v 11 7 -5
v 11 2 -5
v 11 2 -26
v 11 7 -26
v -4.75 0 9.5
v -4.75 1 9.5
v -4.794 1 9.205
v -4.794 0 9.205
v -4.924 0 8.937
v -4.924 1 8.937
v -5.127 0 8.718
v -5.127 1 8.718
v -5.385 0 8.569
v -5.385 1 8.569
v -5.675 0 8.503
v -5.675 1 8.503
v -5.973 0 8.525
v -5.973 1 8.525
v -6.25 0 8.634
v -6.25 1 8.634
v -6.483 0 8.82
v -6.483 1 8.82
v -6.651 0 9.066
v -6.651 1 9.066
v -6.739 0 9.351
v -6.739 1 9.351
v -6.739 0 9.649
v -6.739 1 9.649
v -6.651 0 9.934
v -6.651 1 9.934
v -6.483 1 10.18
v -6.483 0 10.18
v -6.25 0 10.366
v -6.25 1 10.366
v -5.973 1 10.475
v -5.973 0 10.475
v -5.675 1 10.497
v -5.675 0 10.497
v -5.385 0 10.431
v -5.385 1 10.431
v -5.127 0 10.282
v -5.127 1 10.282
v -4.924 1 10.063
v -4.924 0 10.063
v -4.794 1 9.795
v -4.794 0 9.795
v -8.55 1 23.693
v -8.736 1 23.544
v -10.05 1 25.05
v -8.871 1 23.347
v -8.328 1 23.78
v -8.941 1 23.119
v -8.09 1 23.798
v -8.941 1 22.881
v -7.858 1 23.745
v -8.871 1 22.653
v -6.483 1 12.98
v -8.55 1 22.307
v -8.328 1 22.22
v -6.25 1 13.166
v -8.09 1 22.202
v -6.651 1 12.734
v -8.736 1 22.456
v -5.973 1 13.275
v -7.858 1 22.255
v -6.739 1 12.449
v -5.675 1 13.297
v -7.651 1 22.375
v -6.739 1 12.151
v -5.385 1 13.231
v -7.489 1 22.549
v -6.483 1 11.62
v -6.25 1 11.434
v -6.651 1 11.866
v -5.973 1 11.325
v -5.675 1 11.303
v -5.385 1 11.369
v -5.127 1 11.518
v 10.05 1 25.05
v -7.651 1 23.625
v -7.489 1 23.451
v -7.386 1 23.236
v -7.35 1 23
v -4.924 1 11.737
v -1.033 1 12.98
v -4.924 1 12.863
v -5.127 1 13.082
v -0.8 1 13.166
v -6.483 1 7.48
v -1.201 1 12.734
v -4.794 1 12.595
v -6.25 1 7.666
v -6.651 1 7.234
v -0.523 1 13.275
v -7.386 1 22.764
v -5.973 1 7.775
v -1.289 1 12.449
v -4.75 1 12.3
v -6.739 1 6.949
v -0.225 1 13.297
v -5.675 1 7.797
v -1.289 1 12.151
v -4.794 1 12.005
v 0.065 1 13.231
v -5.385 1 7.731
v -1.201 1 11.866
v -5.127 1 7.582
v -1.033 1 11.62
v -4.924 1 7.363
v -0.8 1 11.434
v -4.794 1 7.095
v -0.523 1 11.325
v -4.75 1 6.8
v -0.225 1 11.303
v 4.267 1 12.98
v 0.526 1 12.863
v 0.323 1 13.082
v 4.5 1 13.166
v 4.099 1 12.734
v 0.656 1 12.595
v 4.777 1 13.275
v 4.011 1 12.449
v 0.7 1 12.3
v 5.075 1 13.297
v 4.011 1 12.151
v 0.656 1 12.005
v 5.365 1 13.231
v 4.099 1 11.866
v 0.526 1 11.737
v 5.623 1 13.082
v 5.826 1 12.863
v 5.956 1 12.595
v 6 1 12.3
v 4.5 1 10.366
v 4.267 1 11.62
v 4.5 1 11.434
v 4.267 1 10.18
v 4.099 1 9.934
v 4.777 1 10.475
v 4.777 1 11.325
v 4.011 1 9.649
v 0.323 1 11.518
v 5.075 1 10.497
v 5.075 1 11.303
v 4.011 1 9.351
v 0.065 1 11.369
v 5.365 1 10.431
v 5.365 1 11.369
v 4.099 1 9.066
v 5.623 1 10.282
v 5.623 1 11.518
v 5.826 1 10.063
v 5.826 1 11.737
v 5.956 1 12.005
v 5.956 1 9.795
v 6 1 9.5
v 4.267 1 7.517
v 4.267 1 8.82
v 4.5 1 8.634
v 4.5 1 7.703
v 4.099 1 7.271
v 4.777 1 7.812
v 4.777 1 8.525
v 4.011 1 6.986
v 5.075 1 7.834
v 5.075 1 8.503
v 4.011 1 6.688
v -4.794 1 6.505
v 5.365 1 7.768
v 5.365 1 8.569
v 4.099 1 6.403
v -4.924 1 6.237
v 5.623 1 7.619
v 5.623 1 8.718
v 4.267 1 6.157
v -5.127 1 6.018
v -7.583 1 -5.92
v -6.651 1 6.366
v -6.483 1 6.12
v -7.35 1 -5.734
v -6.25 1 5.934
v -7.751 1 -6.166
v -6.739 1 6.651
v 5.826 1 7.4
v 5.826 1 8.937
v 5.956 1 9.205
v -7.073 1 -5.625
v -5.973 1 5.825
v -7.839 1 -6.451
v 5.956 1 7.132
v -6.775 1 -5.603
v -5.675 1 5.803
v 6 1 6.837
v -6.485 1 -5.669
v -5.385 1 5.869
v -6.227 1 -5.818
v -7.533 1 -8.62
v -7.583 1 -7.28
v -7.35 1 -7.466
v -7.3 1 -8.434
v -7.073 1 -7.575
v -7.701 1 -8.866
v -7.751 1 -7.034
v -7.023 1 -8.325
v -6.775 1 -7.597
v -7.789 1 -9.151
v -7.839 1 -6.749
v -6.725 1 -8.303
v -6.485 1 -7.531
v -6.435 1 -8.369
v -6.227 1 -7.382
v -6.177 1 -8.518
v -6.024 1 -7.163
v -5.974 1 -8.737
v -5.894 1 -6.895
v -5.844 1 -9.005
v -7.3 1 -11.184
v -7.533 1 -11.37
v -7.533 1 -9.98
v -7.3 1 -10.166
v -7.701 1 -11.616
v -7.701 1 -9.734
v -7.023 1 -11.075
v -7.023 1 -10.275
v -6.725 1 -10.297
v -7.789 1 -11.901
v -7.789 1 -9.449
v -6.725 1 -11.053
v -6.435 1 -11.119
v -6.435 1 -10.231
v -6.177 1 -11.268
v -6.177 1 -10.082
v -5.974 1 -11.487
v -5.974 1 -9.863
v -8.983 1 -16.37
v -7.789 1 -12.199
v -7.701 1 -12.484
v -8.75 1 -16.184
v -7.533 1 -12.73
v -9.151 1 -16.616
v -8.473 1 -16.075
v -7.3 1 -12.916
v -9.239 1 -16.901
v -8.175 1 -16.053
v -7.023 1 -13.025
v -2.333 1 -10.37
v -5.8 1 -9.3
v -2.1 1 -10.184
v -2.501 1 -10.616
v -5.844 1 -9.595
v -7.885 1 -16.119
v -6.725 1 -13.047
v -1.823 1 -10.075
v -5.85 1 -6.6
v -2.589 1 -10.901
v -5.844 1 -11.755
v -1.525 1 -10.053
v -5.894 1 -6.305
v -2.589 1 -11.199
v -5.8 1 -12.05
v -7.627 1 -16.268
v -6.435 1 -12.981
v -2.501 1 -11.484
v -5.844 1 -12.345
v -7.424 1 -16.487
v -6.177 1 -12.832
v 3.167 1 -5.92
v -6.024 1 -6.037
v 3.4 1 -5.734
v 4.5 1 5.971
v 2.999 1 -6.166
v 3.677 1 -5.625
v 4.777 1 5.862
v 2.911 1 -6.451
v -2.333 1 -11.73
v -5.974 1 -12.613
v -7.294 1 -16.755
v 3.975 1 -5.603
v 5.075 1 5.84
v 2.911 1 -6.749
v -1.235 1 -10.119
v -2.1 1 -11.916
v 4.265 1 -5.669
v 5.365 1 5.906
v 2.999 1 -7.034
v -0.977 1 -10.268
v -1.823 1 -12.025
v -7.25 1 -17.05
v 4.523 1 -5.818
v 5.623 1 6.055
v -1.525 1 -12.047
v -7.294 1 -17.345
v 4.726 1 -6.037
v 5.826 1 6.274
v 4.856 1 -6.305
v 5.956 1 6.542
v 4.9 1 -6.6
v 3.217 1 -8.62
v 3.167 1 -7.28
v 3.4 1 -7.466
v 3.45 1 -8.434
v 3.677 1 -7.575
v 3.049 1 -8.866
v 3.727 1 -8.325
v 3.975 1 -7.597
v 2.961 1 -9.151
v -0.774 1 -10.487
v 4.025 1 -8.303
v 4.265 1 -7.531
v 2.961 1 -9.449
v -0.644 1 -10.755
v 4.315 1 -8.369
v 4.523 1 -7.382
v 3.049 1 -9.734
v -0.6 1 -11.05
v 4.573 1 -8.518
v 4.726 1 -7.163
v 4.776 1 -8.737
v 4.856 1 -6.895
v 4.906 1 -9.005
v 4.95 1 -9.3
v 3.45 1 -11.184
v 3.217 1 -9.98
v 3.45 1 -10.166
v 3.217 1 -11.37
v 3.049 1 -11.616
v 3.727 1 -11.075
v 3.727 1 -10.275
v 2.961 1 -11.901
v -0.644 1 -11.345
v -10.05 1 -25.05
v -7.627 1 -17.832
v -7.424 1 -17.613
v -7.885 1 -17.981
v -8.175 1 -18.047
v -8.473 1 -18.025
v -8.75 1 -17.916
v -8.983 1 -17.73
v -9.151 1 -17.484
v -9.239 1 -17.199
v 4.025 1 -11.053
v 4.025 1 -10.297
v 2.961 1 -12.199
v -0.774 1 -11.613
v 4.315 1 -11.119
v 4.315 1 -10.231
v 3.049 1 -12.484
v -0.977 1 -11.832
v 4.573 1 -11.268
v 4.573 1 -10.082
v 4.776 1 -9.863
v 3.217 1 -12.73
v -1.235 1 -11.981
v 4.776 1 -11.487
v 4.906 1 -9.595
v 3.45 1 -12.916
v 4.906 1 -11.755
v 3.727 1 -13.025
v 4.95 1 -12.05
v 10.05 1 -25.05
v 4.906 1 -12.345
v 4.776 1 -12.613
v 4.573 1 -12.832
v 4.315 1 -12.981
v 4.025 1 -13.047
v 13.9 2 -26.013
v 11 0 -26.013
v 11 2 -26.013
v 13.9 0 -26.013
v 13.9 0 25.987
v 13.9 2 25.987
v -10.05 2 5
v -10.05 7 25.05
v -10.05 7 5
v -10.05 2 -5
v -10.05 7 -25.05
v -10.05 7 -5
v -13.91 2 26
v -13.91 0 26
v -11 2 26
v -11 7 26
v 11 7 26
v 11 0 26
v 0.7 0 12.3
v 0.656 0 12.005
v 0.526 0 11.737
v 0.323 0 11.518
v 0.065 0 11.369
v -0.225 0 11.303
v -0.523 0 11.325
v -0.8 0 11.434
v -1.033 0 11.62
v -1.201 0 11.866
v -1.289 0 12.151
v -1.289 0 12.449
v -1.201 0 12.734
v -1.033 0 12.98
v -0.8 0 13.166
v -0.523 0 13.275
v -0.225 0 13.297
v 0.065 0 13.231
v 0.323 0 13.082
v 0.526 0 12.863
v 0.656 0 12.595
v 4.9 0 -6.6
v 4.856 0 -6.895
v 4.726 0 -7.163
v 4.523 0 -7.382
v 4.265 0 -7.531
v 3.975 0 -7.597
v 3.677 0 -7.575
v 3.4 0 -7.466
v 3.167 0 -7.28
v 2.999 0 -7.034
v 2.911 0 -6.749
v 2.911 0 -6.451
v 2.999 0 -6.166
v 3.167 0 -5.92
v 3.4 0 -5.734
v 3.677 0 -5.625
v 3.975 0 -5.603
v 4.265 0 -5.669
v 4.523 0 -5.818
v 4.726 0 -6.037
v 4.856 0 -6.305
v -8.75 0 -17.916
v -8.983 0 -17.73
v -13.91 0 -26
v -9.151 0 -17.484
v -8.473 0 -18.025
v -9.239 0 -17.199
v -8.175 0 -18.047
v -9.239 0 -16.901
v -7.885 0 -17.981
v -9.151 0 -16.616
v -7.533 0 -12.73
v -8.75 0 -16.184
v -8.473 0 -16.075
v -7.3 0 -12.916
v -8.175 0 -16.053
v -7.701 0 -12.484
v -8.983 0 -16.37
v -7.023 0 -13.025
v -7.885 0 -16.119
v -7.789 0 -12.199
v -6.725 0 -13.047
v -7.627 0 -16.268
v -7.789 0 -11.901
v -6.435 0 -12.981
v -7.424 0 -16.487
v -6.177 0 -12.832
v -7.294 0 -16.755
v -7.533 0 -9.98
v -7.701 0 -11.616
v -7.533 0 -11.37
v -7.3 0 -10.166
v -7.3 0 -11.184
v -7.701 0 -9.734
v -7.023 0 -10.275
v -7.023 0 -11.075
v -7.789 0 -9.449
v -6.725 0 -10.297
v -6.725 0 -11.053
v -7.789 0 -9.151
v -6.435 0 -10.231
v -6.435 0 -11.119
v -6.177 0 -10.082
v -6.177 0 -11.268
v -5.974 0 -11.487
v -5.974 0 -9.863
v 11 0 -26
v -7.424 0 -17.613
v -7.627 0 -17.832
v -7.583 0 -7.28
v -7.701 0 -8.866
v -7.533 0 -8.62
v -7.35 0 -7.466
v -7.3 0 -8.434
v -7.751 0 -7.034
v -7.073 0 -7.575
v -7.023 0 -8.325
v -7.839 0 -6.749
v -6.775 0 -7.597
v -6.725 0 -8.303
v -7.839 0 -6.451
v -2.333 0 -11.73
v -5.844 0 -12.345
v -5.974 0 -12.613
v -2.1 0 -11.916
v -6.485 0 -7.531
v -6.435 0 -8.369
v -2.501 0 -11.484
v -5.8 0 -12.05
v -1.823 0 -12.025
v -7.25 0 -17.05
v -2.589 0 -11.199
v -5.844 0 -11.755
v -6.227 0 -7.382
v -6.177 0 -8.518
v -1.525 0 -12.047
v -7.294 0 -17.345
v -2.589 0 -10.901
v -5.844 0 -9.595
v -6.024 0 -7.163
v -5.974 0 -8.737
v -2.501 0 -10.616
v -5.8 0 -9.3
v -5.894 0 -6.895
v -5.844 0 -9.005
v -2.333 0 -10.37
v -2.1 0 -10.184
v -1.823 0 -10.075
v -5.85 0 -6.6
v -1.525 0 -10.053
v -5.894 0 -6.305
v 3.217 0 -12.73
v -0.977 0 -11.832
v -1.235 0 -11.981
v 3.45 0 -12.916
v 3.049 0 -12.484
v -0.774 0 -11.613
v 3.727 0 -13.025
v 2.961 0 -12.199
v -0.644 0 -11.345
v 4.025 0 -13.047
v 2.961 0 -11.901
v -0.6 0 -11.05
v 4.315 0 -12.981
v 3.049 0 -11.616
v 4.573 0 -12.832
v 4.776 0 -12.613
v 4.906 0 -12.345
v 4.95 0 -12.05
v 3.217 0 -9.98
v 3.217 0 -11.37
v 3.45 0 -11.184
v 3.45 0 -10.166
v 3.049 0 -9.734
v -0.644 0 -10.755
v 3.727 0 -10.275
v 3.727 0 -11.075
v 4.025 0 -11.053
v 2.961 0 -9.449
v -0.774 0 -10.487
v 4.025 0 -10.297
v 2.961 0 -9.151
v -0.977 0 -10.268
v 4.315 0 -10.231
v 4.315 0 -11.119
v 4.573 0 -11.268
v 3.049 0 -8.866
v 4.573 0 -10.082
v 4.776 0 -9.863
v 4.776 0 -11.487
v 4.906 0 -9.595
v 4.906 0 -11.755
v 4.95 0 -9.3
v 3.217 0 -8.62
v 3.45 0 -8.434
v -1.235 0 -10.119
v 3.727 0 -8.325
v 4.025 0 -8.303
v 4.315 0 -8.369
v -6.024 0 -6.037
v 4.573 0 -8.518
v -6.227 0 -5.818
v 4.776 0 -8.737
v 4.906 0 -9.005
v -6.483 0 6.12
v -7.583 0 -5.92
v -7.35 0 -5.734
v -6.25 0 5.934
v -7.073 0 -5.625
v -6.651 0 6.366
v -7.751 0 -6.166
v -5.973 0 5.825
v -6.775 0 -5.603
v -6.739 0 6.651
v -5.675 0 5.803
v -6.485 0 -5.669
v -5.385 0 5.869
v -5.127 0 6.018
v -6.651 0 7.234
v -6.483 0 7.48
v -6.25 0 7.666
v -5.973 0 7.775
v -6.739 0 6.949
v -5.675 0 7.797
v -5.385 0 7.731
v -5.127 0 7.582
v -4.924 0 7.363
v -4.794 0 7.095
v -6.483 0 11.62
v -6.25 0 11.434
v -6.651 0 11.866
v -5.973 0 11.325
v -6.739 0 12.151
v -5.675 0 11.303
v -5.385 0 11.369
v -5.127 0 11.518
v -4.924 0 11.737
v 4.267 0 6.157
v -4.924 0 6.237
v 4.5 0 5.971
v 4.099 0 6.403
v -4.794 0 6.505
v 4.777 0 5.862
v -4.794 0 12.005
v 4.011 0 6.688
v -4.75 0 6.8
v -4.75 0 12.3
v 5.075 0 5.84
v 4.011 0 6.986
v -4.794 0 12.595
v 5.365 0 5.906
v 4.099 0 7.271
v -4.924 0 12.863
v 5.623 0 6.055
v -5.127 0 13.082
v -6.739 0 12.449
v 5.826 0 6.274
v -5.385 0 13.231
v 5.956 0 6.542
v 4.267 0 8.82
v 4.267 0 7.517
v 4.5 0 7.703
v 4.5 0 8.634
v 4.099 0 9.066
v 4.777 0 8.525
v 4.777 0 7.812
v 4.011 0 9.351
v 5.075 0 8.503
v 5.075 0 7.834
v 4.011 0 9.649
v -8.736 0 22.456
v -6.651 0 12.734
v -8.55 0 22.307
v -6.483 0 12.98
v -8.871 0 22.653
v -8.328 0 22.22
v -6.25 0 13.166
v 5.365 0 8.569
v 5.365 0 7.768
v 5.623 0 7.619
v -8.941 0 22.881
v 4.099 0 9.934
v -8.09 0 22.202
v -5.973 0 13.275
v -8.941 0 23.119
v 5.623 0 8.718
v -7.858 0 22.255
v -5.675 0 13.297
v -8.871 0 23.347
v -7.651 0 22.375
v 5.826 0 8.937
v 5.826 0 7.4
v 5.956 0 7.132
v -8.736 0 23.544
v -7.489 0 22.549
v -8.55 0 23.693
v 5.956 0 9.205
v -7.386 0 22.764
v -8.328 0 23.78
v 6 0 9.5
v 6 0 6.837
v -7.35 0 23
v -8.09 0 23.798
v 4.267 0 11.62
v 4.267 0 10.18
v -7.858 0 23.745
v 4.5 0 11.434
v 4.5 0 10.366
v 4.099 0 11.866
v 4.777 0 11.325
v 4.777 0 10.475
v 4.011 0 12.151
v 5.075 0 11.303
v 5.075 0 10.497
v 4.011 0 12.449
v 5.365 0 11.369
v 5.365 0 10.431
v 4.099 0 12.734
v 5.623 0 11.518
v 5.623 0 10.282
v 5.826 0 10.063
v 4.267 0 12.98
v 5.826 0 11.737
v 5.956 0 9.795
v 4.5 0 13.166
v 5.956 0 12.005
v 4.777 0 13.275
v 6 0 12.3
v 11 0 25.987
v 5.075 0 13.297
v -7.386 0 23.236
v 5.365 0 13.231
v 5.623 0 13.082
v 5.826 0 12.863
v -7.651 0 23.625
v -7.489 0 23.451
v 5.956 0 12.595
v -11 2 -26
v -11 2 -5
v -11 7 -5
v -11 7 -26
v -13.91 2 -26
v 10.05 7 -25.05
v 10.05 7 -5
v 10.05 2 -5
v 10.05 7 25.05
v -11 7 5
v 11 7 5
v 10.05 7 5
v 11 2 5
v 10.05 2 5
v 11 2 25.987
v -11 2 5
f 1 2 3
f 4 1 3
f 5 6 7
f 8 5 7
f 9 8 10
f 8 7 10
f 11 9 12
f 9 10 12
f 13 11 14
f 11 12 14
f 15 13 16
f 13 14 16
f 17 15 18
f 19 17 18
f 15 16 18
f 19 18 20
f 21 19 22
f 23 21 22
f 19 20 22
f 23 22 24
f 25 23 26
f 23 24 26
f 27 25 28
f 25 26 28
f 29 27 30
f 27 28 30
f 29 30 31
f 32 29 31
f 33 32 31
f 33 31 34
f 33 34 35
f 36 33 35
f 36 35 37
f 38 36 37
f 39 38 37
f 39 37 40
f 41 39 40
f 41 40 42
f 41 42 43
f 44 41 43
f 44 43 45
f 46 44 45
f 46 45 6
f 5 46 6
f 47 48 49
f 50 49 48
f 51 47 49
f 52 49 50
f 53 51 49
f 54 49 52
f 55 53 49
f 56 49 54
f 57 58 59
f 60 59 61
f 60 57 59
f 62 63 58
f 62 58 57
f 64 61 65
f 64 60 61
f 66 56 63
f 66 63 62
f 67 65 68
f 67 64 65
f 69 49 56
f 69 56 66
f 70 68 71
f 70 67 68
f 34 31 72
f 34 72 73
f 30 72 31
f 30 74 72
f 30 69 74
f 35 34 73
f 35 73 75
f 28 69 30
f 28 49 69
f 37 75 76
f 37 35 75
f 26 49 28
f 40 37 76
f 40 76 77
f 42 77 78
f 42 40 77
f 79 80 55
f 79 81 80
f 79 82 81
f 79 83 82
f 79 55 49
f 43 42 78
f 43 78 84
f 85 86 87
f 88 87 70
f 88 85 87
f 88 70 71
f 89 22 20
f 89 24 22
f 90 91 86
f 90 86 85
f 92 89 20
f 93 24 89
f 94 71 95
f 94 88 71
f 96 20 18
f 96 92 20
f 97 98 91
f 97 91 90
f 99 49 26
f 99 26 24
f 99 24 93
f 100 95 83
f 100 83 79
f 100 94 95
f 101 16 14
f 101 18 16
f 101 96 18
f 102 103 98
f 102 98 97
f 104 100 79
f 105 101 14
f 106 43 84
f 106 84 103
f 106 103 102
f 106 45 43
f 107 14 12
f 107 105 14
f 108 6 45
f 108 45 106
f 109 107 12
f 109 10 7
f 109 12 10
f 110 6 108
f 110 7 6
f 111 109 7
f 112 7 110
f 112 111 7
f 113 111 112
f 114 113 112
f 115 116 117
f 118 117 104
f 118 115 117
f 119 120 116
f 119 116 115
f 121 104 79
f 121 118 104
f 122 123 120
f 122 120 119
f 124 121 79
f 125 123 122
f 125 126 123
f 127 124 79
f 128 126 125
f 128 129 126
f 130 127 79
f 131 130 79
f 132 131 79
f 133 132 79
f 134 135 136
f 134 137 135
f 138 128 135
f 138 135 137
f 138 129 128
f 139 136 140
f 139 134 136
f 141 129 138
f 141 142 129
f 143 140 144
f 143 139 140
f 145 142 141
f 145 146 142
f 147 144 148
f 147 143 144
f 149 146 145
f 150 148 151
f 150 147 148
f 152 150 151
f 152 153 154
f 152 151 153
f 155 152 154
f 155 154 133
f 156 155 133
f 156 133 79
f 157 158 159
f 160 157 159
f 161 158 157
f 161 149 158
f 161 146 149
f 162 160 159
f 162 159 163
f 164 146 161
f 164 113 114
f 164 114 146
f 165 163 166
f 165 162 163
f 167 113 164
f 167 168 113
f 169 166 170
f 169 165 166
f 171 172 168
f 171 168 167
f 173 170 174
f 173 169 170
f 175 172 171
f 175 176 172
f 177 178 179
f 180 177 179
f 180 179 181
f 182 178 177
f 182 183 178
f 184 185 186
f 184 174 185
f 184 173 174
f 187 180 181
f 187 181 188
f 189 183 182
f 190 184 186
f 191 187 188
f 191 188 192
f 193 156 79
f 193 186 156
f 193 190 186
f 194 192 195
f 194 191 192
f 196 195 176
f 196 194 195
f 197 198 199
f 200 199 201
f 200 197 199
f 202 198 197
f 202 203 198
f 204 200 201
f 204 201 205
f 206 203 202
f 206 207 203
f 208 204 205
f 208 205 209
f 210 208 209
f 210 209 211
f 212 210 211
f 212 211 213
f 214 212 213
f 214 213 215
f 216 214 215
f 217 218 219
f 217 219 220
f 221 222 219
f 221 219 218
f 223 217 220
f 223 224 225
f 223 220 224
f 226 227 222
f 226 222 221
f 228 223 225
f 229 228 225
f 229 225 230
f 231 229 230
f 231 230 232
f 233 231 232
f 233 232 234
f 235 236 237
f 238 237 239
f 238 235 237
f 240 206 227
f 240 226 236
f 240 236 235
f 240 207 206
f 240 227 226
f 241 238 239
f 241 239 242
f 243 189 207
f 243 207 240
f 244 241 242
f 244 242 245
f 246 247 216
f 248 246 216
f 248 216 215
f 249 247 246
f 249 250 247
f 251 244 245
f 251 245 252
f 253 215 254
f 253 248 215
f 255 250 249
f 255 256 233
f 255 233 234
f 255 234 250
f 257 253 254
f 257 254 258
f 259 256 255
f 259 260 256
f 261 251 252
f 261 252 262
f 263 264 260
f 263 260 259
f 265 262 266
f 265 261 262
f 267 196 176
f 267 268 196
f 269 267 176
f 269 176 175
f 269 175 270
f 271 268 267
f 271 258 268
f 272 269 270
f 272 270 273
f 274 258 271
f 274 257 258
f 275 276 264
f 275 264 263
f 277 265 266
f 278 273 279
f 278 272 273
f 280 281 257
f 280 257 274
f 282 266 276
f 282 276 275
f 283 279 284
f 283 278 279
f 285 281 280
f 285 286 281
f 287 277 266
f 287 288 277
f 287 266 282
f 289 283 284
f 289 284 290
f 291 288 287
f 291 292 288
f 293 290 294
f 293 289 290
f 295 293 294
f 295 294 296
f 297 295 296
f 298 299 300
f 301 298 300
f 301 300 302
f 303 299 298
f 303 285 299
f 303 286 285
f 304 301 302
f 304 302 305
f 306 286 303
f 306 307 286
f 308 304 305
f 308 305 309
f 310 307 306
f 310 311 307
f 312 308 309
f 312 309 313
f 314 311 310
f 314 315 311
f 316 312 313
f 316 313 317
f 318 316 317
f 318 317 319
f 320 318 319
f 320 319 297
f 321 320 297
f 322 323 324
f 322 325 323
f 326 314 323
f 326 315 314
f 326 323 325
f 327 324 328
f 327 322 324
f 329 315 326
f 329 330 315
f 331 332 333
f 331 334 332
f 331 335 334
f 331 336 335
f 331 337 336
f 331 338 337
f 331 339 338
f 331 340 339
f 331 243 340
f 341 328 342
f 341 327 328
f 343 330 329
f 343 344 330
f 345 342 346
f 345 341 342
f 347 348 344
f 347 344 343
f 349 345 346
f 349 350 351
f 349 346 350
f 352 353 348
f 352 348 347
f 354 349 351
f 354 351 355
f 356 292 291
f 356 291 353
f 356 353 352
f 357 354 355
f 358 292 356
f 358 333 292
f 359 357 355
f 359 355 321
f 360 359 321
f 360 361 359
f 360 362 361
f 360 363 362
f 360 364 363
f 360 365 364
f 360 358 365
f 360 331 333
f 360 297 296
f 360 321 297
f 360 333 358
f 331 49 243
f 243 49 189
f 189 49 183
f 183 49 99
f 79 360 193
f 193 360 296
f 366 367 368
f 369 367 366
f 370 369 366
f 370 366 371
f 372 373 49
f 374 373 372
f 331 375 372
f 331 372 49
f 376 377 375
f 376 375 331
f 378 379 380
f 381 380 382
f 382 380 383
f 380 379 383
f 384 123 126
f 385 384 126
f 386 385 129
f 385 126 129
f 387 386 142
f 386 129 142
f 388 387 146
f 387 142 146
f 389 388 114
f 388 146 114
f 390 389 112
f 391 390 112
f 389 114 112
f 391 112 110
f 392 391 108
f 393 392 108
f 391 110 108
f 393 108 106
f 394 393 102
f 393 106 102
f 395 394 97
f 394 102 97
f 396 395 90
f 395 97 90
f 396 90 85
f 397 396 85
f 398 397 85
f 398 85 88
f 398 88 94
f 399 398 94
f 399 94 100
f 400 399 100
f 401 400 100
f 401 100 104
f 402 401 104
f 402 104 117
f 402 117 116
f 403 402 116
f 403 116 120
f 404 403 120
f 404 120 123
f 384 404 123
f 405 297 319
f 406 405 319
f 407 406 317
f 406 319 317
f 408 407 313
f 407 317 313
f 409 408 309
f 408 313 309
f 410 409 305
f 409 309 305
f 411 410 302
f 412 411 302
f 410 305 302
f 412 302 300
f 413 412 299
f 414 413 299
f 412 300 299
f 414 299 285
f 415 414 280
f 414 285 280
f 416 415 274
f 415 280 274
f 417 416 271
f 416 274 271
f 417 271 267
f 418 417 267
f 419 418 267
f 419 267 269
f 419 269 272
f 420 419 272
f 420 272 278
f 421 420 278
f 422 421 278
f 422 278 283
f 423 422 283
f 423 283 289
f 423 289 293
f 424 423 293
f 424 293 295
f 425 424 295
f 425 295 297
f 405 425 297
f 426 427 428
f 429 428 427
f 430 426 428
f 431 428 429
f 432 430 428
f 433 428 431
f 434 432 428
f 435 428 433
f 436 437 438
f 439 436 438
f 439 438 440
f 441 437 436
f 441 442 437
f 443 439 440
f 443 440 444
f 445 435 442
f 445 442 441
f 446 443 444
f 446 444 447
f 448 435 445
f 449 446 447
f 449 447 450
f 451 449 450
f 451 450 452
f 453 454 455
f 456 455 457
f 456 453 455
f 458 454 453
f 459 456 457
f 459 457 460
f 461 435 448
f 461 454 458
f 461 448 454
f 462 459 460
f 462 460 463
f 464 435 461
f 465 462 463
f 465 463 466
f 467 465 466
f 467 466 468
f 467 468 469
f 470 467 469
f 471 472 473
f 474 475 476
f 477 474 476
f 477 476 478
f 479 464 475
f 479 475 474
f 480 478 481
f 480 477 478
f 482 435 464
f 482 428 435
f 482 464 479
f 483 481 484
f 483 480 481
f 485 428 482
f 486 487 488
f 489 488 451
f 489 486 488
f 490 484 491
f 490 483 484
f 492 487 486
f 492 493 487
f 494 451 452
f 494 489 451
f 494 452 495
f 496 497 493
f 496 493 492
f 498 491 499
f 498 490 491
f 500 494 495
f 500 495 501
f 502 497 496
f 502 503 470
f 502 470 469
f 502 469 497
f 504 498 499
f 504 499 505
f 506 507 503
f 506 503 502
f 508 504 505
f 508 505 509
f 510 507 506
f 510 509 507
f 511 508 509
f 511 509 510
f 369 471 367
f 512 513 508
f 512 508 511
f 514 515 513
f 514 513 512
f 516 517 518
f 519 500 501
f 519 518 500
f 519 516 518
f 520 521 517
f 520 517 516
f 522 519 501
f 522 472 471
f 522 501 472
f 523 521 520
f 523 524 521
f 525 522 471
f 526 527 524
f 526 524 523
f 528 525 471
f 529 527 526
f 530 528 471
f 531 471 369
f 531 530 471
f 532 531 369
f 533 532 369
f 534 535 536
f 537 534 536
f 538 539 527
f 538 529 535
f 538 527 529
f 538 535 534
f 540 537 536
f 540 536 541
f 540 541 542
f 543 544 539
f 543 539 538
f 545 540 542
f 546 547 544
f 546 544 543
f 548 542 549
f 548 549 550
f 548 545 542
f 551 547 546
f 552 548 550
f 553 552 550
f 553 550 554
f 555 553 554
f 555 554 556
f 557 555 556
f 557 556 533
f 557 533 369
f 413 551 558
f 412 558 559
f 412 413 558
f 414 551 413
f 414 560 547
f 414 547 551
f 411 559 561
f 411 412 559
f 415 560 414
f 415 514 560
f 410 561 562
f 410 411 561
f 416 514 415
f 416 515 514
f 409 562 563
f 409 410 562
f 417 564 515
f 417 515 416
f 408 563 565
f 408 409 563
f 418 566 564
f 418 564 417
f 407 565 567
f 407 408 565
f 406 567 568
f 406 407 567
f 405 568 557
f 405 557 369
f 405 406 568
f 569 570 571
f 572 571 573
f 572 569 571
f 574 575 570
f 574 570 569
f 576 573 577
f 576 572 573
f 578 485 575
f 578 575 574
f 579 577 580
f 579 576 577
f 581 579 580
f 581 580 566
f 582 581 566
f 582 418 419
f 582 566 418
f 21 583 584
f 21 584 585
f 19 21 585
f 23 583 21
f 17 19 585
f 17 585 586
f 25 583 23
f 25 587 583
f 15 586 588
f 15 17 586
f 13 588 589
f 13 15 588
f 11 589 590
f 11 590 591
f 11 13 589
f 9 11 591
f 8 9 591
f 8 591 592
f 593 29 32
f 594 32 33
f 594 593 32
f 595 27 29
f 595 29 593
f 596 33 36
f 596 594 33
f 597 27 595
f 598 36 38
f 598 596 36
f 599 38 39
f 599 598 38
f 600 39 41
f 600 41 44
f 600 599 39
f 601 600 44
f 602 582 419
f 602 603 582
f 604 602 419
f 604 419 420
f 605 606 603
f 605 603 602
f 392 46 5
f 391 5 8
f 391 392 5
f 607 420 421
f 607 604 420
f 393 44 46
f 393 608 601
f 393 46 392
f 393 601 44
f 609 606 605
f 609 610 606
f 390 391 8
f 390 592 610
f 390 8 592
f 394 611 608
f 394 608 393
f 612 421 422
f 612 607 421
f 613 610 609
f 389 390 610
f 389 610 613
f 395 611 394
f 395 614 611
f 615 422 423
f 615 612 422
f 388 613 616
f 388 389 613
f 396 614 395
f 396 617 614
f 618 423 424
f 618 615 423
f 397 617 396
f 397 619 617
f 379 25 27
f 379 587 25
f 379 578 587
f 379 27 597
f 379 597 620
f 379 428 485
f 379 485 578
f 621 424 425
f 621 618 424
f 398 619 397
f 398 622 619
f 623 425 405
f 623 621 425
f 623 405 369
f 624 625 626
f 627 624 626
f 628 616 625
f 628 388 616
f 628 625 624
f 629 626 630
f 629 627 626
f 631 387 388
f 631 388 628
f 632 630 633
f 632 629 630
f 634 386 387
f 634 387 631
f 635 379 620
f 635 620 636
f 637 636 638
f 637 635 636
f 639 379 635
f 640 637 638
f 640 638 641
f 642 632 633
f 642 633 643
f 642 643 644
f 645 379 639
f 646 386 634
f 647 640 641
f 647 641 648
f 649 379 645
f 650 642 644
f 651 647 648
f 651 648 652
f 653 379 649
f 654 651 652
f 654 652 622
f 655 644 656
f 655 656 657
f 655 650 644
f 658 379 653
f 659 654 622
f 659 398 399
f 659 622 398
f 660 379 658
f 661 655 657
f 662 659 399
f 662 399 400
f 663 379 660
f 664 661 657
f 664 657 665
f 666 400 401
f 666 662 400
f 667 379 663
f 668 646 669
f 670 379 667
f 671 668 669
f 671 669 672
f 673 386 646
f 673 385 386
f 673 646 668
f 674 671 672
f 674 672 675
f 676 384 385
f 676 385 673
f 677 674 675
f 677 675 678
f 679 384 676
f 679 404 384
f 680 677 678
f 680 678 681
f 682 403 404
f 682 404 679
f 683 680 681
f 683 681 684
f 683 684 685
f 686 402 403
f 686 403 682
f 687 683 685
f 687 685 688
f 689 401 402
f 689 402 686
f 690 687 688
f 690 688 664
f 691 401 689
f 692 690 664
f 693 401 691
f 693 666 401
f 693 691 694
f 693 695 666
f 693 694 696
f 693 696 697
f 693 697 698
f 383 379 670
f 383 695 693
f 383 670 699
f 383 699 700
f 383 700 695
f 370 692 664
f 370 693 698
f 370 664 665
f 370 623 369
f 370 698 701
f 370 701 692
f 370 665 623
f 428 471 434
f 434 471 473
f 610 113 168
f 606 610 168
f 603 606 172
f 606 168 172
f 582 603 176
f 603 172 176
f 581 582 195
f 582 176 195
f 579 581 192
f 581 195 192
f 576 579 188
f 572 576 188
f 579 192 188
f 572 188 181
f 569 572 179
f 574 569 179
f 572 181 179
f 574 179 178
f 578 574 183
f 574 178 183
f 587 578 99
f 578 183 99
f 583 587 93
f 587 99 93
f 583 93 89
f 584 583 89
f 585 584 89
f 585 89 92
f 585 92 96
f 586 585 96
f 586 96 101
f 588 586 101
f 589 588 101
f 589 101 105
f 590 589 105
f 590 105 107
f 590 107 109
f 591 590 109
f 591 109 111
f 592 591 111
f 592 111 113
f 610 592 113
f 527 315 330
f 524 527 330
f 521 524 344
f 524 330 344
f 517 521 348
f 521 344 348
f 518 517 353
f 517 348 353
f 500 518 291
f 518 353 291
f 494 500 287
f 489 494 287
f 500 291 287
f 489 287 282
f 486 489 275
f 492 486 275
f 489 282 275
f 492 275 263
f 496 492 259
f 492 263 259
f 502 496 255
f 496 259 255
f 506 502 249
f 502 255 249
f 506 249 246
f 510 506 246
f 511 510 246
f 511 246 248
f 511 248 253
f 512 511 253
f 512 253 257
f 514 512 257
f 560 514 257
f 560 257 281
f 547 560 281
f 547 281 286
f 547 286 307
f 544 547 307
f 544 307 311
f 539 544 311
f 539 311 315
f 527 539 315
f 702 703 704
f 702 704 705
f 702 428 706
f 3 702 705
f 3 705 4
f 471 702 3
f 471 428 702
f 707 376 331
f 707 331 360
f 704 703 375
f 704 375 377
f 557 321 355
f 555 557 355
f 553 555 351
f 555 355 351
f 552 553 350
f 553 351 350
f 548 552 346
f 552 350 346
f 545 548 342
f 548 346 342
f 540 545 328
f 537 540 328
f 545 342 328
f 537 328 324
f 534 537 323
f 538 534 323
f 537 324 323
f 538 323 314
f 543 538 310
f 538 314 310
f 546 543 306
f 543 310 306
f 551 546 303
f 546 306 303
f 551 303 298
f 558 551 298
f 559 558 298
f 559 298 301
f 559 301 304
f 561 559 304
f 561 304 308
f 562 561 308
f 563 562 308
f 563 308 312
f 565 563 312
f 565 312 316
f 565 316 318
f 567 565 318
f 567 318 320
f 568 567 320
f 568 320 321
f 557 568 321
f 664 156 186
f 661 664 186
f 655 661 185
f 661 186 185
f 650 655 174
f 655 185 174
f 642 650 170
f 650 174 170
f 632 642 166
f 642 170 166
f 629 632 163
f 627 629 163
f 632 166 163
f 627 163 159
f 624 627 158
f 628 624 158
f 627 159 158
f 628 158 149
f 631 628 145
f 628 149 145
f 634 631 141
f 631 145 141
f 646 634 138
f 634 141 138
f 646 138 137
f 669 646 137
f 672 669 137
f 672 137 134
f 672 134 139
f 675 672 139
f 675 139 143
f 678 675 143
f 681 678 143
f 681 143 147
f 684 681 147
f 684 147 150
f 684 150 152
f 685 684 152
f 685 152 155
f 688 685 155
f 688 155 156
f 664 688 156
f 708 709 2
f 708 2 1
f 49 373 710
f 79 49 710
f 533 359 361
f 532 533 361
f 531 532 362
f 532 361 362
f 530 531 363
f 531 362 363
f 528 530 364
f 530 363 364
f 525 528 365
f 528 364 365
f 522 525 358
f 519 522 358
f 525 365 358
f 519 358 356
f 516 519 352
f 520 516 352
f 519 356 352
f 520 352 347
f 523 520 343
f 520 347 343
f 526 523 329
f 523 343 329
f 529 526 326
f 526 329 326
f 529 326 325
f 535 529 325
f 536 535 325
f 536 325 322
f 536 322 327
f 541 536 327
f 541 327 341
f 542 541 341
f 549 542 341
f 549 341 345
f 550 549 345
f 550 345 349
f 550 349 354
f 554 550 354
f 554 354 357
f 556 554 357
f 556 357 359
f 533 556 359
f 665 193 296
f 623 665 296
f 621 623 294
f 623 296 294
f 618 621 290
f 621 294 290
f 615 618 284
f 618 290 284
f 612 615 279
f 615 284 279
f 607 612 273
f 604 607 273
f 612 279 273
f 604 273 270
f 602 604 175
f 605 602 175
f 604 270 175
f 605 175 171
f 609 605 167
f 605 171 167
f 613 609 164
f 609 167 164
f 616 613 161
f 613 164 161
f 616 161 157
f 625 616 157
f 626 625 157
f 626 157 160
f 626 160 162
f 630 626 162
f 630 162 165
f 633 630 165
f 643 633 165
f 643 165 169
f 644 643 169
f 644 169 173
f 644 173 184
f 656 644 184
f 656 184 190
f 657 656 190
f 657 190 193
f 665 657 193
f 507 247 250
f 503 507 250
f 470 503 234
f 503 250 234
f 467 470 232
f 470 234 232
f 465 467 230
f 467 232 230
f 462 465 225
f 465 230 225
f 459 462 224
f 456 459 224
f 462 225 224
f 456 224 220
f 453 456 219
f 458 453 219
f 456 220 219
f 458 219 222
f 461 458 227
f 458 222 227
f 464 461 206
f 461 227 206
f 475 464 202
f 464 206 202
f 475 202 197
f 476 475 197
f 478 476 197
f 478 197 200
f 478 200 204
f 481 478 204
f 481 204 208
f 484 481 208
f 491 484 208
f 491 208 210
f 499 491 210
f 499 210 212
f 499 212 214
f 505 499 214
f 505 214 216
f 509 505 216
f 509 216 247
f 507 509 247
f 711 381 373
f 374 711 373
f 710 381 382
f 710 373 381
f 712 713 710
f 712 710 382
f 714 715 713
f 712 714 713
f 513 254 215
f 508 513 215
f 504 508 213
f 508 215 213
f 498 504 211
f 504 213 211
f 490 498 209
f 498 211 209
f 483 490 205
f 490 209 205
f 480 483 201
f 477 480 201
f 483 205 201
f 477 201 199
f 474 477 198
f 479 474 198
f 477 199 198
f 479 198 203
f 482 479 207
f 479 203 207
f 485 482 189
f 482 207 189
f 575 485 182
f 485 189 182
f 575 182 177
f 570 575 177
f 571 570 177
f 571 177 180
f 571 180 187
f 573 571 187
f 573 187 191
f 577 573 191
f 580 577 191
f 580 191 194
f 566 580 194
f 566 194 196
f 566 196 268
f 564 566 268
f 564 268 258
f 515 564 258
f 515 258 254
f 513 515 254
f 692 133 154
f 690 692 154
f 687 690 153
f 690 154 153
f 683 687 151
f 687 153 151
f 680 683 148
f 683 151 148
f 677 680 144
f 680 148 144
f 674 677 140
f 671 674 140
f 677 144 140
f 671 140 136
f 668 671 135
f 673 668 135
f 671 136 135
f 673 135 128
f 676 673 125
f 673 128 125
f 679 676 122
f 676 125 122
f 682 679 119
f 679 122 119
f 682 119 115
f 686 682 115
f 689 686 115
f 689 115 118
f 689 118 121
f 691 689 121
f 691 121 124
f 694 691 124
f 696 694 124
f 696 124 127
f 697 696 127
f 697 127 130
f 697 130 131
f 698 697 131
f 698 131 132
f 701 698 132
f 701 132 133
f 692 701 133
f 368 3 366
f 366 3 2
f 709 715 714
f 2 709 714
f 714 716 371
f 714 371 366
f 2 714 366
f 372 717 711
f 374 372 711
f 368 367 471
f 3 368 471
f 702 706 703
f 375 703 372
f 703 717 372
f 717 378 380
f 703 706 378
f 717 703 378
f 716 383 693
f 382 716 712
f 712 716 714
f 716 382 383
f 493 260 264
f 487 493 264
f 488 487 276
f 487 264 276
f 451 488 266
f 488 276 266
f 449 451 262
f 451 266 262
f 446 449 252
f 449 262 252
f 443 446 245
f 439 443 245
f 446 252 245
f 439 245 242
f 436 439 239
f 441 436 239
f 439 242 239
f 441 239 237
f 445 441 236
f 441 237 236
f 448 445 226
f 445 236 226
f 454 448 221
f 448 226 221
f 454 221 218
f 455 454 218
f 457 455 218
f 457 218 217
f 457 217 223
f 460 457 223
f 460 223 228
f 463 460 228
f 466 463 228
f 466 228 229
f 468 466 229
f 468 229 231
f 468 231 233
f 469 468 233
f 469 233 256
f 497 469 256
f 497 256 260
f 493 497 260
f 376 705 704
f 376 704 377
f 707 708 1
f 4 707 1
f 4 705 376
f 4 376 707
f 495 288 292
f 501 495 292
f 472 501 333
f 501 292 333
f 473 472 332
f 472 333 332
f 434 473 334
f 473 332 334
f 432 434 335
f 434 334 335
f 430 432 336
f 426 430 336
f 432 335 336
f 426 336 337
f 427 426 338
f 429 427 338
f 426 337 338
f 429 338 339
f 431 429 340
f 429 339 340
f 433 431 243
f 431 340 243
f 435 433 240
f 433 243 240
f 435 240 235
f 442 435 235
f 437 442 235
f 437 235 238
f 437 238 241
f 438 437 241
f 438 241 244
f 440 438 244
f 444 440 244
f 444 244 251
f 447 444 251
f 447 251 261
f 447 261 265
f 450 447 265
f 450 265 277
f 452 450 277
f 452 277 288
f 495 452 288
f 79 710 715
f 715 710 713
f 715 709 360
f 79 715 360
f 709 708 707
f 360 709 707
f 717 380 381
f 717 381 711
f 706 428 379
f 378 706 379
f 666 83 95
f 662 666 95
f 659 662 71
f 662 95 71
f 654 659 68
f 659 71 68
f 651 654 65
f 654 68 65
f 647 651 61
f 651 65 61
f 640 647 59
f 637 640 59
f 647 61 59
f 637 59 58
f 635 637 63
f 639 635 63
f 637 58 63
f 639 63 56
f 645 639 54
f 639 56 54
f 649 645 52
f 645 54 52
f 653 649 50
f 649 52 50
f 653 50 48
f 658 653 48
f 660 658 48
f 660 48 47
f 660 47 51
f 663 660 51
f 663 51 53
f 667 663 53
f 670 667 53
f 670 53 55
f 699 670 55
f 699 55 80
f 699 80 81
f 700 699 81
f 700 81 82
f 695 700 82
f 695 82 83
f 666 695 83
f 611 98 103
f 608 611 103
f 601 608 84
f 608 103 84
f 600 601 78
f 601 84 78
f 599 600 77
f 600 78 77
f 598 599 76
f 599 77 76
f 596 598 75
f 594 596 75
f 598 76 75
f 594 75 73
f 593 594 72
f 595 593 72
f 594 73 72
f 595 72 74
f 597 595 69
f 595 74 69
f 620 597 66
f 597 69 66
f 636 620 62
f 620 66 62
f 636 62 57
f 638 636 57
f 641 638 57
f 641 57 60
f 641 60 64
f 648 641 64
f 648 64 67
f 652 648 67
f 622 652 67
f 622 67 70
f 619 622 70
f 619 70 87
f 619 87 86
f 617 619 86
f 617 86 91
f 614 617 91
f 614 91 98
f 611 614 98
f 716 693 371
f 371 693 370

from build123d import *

# Parameters (mm, degrees)
SKETCH1_W               = 22
SKETCH1_H               = 52
BOSS_EXTRUDE1_DEPTH     = 7
SKETCH2_W               = 20.1
SKETCH2_H               = 50.1
CUT_EXTRUDE1_DEPTH      = 6
SKETCH7_R               = 0.8
CUT_EXTRUDE6_DEPTH      = 7
CUT_EXTRUDE6_DEPTH_BACK = 2
CUT_EXTRUDE7_REACH      = 3
SKETCH8_R               = 1
CUT_EXTRUDE9_REACH      = 3
SKETCH9_R               = 1
CUT_EXTRUDE10_REACH     = 3
SKETCH10_R              = 1
CUT_EXTRUDE11_REACH     = 3
SKETCH11_R              = 1
CUT_EXTRUDE12_REACH     = 3
SKETCH12_R              = 1
CUT_EXTRUDE13_REACH     = 3
SKETCH13_R              = 1
CUT_EXTRUDE14_REACH     = 3
SKETCH14_R              = 1
CUT_EXTRUDE15_REACH     = 3
SKETCH15_R              = 1
CUT_EXTRUDE16_REACH     = 3
SKETCH16_R              = 1
SKETCH18_W              = 2.91
SKETCH18_H              = 52
BOSS_EXTRUDE2_DEPTH     = 2
SKETCH18_3_W            = 2.9
SKETCH18_3_H            = 52
BOSS_EXTRUDE3_DEPTH     = 2
SKETCH19_W              = 10
SKETCH19_H              = 5
CUT_EXTRUDE17_DEPTH     = 25.9


with BuildPart() as part:
    # Sketch1 → Boss-Extrude1 (new body)
    with BuildSketch(Plane(origin=(0, 0, 0), x_dir=(1, 0, 0), z_dir=(0, 1, 0))):
        Rectangle(SKETCH1_W, SKETCH1_H)
    extrude(amount=BOSS_EXTRUDE1_DEPTH)

    # Sketch2 → Cut-Extrude1 (cut)
    with BuildSketch(Plane(origin=(0, 7, 0), x_dir=(1, 0, 0), z_dir=(0, 1, 0))):
        Rectangle(SKETCH2_W, SKETCH2_H)
    extrude(amount=-CUT_EXTRUDE1_DEPTH, mode=Mode.SUBTRACT)

    # Sketch7 → Cut-Extrude6 (cut, two sides)
    with BuildSketch(Plane(origin=(0, 1, 0), x_dir=(1, 0, 0), z_dir=(0, 1, 0))) as cut_extrude6_sk:
        with Locations((-8.15, -23)):
            Circle(SKETCH7_R)
    extrude(amount=CUT_EXTRUDE6_DEPTH, mode=Mode.SUBTRACT)
    extrude(cut_extrude6_sk.sketch, amount=-CUT_EXTRUDE6_DEPTH_BACK, mode=Mode.SUBTRACT)

    # Sketch8 → Cut-Extrude7 (cut, up to next)
    with BuildSketch(Plane(origin=(0, 1, 0), x_dir=(1, 0, 0), z_dir=(0, 1, 0)), mode=Mode.PRIVATE) as cut_extrude7_sk1:
        with Locations((-5.75, -12.3)):
            Circle(SKETCH8_R)
    cut_extrude7_tool1 = extrude(cut_extrude7_sk1.sketch, amount=-CUT_EXTRUDE7_REACH, mode=Mode.PRIVATE) & part.part
    add(cut_extrude7_tool1.solids().sort_by_distance((-5.75, 1, 12.3))[0], mode=Mode.SUBTRACT)
    # Sketch8 → Cut-Extrude7 (cut, up to next)
    with BuildSketch(Plane(origin=(0, 1, 0), x_dir=(1, 0, 0), z_dir=(0, 1, 0)), mode=Mode.PRIVATE) as cut_extrude7_sk2:
        with Locations((5, -12.3)):
            Circle(SKETCH8_R)
    cut_extrude7_tool2 = extrude(cut_extrude7_sk2.sketch, amount=-CUT_EXTRUDE7_REACH, mode=Mode.PRIVATE) & part.part
    add(cut_extrude7_tool2.solids().sort_by_distance((5, 1, 12.3))[0], mode=Mode.SUBTRACT)

    # Sketch9 → Cut-Extrude9 (cut, up to next)
    with BuildSketch(Plane(origin=(0, 1, 0), x_dir=(1, 0, 0), z_dir=(0, 1, 0)), mode=Mode.PRIVATE) as cut_extrude9_sk1:
        with Locations((-5.75, -9.5)):
            Circle(SKETCH9_R)
    cut_extrude9_tool1 = extrude(cut_extrude9_sk1.sketch, amount=-CUT_EXTRUDE9_REACH, mode=Mode.PRIVATE) & part.part
    add(cut_extrude9_tool1.solids().sort_by_distance((-5.75, 1, 9.5))[0], mode=Mode.SUBTRACT)
    # Sketch9 → Cut-Extrude9 (cut, up to next)
    with BuildSketch(Plane(origin=(0, 1, 0), x_dir=(1, 0, 0), z_dir=(0, 1, 0)), mode=Mode.PRIVATE) as cut_extrude9_sk2:
        with Locations((5, -9.5)):
            Circle(SKETCH9_R)
    cut_extrude9_tool2 = extrude(cut_extrude9_sk2.sketch, amount=-CUT_EXTRUDE9_REACH, mode=Mode.PRIVATE) & part.part
    add(cut_extrude9_tool2.solids().sort_by_distance((5, 1, 9.5))[0], mode=Mode.SUBTRACT)

    # Sketch10 → Cut-Extrude10 (cut, up to next)
    with BuildSketch(Plane(origin=(0, 1, 0), x_dir=(1, 0, 0), z_dir=(0, 1, 0)), mode=Mode.PRIVATE) as cut_extrude10_sk1:
        with Locations((-5.75, -6.8)):
            Circle(SKETCH10_R)
    cut_extrude10_tool1 = extrude(cut_extrude10_sk1.sketch, amount=-CUT_EXTRUDE10_REACH, mode=Mode.PRIVATE) & part.part
    add(cut_extrude10_tool1.solids().sort_by_distance((-5.75, 1, 6.8))[0], mode=Mode.SUBTRACT)
    # Sketch10 → Cut-Extrude10 (cut, up to next)
    with BuildSketch(Plane(origin=(0, 1, 0), x_dir=(1, 0, 0), z_dir=(0, 1, 0)), mode=Mode.PRIVATE) as cut_extrude10_sk2:
        with Locations((5, -6.837159935)):
            Circle(SKETCH10_R)
    cut_extrude10_tool2 = extrude(cut_extrude10_sk2.sketch, amount=-CUT_EXTRUDE10_REACH, mode=Mode.PRIVATE) & part.part
    add(cut_extrude10_tool2.solids().sort_by_distance((5, 1, 6.83716))[0], mode=Mode.SUBTRACT)

    # Sketch11 → Cut-Extrude11 (cut, up to next)
    with BuildSketch(Plane(origin=(0, 1, 0), x_dir=(1, 0, 0), z_dir=(0, 1, 0)), mode=Mode.PRIVATE) as cut_extrude11_sk1:
        with Locations((-0.3, -12.3)):
            Circle(SKETCH11_R)
    cut_extrude11_tool1 = extrude(cut_extrude11_sk1.sketch, amount=-CUT_EXTRUDE11_REACH, mode=Mode.PRIVATE) & part.part
    add(cut_extrude11_tool1.solids().sort_by_distance((-0.3, 1, 12.3))[0], mode=Mode.SUBTRACT)

    # Sketch12 → Cut-Extrude12 (cut, up to next)
    with BuildSketch(Plane(origin=(0, 1, 0), x_dir=(1, 0, 0), z_dir=(0, 1, 0)), mode=Mode.PRIVATE) as cut_extrude12_sk1:
        with Locations((3.95, 12.05)):
            Circle(SKETCH12_R)
    cut_extrude12_tool1 = extrude(cut_extrude12_sk1.sketch, amount=-CUT_EXTRUDE12_REACH, mode=Mode.PRIVATE) & part.part
    add(cut_extrude12_tool1.solids().sort_by_distance((3.95, 1, -12.05))[0], mode=Mode.SUBTRACT)
    # Sketch12 → Cut-Extrude12 (cut, up to next)
    with BuildSketch(Plane(origin=(0, 1, 0), x_dir=(1, 0, 0), z_dir=(0, 1, 0)), mode=Mode.PRIVATE) as cut_extrude12_sk2:
        with Locations((-6.8, 12.05)):
            Circle(SKETCH12_R)
    cut_extrude12_tool2 = extrude(cut_extrude12_sk2.sketch, amount=-CUT_EXTRUDE12_REACH, mode=Mode.PRIVATE) & part.part
    add(cut_extrude12_tool2.solids().sort_by_distance((-6.8, 1, -12.05))[0], mode=Mode.SUBTRACT)

    # Sketch13 → Cut-Extrude13 (cut, up to next)
    with BuildSketch(Plane(origin=(0, 1, 0), x_dir=(1, 0, 0), z_dir=(0, 1, 0)), mode=Mode.PRIVATE) as cut_extrude13_sk1:
        with Locations((3.95, 9.3)):
            Circle(SKETCH13_R)
    cut_extrude13_tool1 = extrude(cut_extrude13_sk1.sketch, amount=-CUT_EXTRUDE13_REACH, mode=Mode.PRIVATE) & part.part
    add(cut_extrude13_tool1.solids().sort_by_distance((3.95, 1, -9.3))[0], mode=Mode.SUBTRACT)
    # Sketch13 → Cut-Extrude13 (cut, up to next)
    with BuildSketch(Plane(origin=(0, 1, 0), x_dir=(1, 0, 0), z_dir=(0, 1, 0)), mode=Mode.PRIVATE) as cut_extrude13_sk2:
        with Locations((-6.8, 9.3)):
            Circle(SKETCH13_R)
    cut_extrude13_tool2 = extrude(cut_extrude13_sk2.sketch, amount=-CUT_EXTRUDE13_REACH, mode=Mode.PRIVATE) & part.part
    add(cut_extrude13_tool2.solids().sort_by_distance((-6.8, 1, -9.3))[0], mode=Mode.SUBTRACT)

    # Sketch14 → Cut-Extrude14 (cut, up to next)
    with BuildSketch(Plane(origin=(0, 1, 0), x_dir=(1, 0, 0), z_dir=(0, 1, 0)), mode=Mode.PRIVATE) as cut_extrude14_sk1:
        with Locations((3.9, 6.6)):
            Circle(SKETCH14_R)
    cut_extrude14_tool1 = extrude(cut_extrude14_sk1.sketch, amount=-CUT_EXTRUDE14_REACH, mode=Mode.PRIVATE) & part.part
    add(cut_extrude14_tool1.solids().sort_by_distance((3.9, 1, -6.6))[0], mode=Mode.SUBTRACT)
    # Sketch14 → Cut-Extrude14 (cut, up to next)
    with BuildSketch(Plane(origin=(0, 1, 0), x_dir=(1, 0, 0), z_dir=(0, 1, 0)), mode=Mode.PRIVATE) as cut_extrude14_sk2:
        with Locations((-6.85, 6.6)):
            Circle(SKETCH14_R)
    cut_extrude14_tool2 = extrude(cut_extrude14_sk2.sketch, amount=-CUT_EXTRUDE14_REACH, mode=Mode.PRIVATE) & part.part
    add(cut_extrude14_tool2.solids().sort_by_distance((-6.85, 1, -6.6))[0], mode=Mode.SUBTRACT)

    # Sketch15 → Cut-Extrude15 (cut, up to next)
    with BuildSketch(Plane(origin=(0, 1, 0), x_dir=(1, 0, 0), z_dir=(0, 1, 0)), mode=Mode.PRIVATE) as cut_extrude15_sk1:
        with Locations((-1.6, 11.05)):
            Circle(SKETCH15_R)
    cut_extrude15_tool1 = extrude(cut_extrude15_sk1.sketch, amount=-CUT_EXTRUDE15_REACH, mode=Mode.PRIVATE) & part.part
    add(cut_extrude15_tool1.solids().sort_by_distance((-1.6, 1, -11.05))[0], mode=Mode.SUBTRACT)

    # Sketch16 → Cut-Extrude16 (cut, up to next)
    with BuildSketch(Plane(origin=(0, 1, 0), x_dir=(1, 0, 0), z_dir=(0, 1, 0)), mode=Mode.PRIVATE) as cut_extrude16_sk1:
        with Locations((-8.25, 17.05)):
            Circle(SKETCH16_R)
    cut_extrude16_tool1 = extrude(cut_extrude16_sk1.sketch, amount=-CUT_EXTRUDE16_REACH, mode=Mode.PRIVATE) & part.part
    add(cut_extrude16_tool1.solids().sort_by_distance((-8.25, 1, -17.05))[0], mode=Mode.SUBTRACT)

    # Sketch18 → Boss-Extrude2 (add)
    with BuildSketch(Plane.XZ):
        with Locations((-12.455, 0)):
            Rectangle(SKETCH18_W, SKETCH18_H)
    extrude(amount=-BOSS_EXTRUDE2_DEPTH)

    # Sketch18<3> → Boss-Extrude3 (add)
    with BuildSketch(Plane.XZ):
        with Locations((12.45, -0.012983648)):
            Rectangle(SKETCH18_3_W, SKETCH18_3_H)
    extrude(amount=-BOSS_EXTRUDE3_DEPTH)

    # Sketch19 → Cut-Extrude17 (cut, through all)
    with BuildSketch(Plane.ZY.offset(11)):
        with Locations((0, 4.5)):
            Rectangle(SKETCH19_W, SKETCH19_H)
    extrude(amount=-CUT_EXTRUDE17_DEPTH, mode=Mode.SUBTRACT)


solid = part.part
